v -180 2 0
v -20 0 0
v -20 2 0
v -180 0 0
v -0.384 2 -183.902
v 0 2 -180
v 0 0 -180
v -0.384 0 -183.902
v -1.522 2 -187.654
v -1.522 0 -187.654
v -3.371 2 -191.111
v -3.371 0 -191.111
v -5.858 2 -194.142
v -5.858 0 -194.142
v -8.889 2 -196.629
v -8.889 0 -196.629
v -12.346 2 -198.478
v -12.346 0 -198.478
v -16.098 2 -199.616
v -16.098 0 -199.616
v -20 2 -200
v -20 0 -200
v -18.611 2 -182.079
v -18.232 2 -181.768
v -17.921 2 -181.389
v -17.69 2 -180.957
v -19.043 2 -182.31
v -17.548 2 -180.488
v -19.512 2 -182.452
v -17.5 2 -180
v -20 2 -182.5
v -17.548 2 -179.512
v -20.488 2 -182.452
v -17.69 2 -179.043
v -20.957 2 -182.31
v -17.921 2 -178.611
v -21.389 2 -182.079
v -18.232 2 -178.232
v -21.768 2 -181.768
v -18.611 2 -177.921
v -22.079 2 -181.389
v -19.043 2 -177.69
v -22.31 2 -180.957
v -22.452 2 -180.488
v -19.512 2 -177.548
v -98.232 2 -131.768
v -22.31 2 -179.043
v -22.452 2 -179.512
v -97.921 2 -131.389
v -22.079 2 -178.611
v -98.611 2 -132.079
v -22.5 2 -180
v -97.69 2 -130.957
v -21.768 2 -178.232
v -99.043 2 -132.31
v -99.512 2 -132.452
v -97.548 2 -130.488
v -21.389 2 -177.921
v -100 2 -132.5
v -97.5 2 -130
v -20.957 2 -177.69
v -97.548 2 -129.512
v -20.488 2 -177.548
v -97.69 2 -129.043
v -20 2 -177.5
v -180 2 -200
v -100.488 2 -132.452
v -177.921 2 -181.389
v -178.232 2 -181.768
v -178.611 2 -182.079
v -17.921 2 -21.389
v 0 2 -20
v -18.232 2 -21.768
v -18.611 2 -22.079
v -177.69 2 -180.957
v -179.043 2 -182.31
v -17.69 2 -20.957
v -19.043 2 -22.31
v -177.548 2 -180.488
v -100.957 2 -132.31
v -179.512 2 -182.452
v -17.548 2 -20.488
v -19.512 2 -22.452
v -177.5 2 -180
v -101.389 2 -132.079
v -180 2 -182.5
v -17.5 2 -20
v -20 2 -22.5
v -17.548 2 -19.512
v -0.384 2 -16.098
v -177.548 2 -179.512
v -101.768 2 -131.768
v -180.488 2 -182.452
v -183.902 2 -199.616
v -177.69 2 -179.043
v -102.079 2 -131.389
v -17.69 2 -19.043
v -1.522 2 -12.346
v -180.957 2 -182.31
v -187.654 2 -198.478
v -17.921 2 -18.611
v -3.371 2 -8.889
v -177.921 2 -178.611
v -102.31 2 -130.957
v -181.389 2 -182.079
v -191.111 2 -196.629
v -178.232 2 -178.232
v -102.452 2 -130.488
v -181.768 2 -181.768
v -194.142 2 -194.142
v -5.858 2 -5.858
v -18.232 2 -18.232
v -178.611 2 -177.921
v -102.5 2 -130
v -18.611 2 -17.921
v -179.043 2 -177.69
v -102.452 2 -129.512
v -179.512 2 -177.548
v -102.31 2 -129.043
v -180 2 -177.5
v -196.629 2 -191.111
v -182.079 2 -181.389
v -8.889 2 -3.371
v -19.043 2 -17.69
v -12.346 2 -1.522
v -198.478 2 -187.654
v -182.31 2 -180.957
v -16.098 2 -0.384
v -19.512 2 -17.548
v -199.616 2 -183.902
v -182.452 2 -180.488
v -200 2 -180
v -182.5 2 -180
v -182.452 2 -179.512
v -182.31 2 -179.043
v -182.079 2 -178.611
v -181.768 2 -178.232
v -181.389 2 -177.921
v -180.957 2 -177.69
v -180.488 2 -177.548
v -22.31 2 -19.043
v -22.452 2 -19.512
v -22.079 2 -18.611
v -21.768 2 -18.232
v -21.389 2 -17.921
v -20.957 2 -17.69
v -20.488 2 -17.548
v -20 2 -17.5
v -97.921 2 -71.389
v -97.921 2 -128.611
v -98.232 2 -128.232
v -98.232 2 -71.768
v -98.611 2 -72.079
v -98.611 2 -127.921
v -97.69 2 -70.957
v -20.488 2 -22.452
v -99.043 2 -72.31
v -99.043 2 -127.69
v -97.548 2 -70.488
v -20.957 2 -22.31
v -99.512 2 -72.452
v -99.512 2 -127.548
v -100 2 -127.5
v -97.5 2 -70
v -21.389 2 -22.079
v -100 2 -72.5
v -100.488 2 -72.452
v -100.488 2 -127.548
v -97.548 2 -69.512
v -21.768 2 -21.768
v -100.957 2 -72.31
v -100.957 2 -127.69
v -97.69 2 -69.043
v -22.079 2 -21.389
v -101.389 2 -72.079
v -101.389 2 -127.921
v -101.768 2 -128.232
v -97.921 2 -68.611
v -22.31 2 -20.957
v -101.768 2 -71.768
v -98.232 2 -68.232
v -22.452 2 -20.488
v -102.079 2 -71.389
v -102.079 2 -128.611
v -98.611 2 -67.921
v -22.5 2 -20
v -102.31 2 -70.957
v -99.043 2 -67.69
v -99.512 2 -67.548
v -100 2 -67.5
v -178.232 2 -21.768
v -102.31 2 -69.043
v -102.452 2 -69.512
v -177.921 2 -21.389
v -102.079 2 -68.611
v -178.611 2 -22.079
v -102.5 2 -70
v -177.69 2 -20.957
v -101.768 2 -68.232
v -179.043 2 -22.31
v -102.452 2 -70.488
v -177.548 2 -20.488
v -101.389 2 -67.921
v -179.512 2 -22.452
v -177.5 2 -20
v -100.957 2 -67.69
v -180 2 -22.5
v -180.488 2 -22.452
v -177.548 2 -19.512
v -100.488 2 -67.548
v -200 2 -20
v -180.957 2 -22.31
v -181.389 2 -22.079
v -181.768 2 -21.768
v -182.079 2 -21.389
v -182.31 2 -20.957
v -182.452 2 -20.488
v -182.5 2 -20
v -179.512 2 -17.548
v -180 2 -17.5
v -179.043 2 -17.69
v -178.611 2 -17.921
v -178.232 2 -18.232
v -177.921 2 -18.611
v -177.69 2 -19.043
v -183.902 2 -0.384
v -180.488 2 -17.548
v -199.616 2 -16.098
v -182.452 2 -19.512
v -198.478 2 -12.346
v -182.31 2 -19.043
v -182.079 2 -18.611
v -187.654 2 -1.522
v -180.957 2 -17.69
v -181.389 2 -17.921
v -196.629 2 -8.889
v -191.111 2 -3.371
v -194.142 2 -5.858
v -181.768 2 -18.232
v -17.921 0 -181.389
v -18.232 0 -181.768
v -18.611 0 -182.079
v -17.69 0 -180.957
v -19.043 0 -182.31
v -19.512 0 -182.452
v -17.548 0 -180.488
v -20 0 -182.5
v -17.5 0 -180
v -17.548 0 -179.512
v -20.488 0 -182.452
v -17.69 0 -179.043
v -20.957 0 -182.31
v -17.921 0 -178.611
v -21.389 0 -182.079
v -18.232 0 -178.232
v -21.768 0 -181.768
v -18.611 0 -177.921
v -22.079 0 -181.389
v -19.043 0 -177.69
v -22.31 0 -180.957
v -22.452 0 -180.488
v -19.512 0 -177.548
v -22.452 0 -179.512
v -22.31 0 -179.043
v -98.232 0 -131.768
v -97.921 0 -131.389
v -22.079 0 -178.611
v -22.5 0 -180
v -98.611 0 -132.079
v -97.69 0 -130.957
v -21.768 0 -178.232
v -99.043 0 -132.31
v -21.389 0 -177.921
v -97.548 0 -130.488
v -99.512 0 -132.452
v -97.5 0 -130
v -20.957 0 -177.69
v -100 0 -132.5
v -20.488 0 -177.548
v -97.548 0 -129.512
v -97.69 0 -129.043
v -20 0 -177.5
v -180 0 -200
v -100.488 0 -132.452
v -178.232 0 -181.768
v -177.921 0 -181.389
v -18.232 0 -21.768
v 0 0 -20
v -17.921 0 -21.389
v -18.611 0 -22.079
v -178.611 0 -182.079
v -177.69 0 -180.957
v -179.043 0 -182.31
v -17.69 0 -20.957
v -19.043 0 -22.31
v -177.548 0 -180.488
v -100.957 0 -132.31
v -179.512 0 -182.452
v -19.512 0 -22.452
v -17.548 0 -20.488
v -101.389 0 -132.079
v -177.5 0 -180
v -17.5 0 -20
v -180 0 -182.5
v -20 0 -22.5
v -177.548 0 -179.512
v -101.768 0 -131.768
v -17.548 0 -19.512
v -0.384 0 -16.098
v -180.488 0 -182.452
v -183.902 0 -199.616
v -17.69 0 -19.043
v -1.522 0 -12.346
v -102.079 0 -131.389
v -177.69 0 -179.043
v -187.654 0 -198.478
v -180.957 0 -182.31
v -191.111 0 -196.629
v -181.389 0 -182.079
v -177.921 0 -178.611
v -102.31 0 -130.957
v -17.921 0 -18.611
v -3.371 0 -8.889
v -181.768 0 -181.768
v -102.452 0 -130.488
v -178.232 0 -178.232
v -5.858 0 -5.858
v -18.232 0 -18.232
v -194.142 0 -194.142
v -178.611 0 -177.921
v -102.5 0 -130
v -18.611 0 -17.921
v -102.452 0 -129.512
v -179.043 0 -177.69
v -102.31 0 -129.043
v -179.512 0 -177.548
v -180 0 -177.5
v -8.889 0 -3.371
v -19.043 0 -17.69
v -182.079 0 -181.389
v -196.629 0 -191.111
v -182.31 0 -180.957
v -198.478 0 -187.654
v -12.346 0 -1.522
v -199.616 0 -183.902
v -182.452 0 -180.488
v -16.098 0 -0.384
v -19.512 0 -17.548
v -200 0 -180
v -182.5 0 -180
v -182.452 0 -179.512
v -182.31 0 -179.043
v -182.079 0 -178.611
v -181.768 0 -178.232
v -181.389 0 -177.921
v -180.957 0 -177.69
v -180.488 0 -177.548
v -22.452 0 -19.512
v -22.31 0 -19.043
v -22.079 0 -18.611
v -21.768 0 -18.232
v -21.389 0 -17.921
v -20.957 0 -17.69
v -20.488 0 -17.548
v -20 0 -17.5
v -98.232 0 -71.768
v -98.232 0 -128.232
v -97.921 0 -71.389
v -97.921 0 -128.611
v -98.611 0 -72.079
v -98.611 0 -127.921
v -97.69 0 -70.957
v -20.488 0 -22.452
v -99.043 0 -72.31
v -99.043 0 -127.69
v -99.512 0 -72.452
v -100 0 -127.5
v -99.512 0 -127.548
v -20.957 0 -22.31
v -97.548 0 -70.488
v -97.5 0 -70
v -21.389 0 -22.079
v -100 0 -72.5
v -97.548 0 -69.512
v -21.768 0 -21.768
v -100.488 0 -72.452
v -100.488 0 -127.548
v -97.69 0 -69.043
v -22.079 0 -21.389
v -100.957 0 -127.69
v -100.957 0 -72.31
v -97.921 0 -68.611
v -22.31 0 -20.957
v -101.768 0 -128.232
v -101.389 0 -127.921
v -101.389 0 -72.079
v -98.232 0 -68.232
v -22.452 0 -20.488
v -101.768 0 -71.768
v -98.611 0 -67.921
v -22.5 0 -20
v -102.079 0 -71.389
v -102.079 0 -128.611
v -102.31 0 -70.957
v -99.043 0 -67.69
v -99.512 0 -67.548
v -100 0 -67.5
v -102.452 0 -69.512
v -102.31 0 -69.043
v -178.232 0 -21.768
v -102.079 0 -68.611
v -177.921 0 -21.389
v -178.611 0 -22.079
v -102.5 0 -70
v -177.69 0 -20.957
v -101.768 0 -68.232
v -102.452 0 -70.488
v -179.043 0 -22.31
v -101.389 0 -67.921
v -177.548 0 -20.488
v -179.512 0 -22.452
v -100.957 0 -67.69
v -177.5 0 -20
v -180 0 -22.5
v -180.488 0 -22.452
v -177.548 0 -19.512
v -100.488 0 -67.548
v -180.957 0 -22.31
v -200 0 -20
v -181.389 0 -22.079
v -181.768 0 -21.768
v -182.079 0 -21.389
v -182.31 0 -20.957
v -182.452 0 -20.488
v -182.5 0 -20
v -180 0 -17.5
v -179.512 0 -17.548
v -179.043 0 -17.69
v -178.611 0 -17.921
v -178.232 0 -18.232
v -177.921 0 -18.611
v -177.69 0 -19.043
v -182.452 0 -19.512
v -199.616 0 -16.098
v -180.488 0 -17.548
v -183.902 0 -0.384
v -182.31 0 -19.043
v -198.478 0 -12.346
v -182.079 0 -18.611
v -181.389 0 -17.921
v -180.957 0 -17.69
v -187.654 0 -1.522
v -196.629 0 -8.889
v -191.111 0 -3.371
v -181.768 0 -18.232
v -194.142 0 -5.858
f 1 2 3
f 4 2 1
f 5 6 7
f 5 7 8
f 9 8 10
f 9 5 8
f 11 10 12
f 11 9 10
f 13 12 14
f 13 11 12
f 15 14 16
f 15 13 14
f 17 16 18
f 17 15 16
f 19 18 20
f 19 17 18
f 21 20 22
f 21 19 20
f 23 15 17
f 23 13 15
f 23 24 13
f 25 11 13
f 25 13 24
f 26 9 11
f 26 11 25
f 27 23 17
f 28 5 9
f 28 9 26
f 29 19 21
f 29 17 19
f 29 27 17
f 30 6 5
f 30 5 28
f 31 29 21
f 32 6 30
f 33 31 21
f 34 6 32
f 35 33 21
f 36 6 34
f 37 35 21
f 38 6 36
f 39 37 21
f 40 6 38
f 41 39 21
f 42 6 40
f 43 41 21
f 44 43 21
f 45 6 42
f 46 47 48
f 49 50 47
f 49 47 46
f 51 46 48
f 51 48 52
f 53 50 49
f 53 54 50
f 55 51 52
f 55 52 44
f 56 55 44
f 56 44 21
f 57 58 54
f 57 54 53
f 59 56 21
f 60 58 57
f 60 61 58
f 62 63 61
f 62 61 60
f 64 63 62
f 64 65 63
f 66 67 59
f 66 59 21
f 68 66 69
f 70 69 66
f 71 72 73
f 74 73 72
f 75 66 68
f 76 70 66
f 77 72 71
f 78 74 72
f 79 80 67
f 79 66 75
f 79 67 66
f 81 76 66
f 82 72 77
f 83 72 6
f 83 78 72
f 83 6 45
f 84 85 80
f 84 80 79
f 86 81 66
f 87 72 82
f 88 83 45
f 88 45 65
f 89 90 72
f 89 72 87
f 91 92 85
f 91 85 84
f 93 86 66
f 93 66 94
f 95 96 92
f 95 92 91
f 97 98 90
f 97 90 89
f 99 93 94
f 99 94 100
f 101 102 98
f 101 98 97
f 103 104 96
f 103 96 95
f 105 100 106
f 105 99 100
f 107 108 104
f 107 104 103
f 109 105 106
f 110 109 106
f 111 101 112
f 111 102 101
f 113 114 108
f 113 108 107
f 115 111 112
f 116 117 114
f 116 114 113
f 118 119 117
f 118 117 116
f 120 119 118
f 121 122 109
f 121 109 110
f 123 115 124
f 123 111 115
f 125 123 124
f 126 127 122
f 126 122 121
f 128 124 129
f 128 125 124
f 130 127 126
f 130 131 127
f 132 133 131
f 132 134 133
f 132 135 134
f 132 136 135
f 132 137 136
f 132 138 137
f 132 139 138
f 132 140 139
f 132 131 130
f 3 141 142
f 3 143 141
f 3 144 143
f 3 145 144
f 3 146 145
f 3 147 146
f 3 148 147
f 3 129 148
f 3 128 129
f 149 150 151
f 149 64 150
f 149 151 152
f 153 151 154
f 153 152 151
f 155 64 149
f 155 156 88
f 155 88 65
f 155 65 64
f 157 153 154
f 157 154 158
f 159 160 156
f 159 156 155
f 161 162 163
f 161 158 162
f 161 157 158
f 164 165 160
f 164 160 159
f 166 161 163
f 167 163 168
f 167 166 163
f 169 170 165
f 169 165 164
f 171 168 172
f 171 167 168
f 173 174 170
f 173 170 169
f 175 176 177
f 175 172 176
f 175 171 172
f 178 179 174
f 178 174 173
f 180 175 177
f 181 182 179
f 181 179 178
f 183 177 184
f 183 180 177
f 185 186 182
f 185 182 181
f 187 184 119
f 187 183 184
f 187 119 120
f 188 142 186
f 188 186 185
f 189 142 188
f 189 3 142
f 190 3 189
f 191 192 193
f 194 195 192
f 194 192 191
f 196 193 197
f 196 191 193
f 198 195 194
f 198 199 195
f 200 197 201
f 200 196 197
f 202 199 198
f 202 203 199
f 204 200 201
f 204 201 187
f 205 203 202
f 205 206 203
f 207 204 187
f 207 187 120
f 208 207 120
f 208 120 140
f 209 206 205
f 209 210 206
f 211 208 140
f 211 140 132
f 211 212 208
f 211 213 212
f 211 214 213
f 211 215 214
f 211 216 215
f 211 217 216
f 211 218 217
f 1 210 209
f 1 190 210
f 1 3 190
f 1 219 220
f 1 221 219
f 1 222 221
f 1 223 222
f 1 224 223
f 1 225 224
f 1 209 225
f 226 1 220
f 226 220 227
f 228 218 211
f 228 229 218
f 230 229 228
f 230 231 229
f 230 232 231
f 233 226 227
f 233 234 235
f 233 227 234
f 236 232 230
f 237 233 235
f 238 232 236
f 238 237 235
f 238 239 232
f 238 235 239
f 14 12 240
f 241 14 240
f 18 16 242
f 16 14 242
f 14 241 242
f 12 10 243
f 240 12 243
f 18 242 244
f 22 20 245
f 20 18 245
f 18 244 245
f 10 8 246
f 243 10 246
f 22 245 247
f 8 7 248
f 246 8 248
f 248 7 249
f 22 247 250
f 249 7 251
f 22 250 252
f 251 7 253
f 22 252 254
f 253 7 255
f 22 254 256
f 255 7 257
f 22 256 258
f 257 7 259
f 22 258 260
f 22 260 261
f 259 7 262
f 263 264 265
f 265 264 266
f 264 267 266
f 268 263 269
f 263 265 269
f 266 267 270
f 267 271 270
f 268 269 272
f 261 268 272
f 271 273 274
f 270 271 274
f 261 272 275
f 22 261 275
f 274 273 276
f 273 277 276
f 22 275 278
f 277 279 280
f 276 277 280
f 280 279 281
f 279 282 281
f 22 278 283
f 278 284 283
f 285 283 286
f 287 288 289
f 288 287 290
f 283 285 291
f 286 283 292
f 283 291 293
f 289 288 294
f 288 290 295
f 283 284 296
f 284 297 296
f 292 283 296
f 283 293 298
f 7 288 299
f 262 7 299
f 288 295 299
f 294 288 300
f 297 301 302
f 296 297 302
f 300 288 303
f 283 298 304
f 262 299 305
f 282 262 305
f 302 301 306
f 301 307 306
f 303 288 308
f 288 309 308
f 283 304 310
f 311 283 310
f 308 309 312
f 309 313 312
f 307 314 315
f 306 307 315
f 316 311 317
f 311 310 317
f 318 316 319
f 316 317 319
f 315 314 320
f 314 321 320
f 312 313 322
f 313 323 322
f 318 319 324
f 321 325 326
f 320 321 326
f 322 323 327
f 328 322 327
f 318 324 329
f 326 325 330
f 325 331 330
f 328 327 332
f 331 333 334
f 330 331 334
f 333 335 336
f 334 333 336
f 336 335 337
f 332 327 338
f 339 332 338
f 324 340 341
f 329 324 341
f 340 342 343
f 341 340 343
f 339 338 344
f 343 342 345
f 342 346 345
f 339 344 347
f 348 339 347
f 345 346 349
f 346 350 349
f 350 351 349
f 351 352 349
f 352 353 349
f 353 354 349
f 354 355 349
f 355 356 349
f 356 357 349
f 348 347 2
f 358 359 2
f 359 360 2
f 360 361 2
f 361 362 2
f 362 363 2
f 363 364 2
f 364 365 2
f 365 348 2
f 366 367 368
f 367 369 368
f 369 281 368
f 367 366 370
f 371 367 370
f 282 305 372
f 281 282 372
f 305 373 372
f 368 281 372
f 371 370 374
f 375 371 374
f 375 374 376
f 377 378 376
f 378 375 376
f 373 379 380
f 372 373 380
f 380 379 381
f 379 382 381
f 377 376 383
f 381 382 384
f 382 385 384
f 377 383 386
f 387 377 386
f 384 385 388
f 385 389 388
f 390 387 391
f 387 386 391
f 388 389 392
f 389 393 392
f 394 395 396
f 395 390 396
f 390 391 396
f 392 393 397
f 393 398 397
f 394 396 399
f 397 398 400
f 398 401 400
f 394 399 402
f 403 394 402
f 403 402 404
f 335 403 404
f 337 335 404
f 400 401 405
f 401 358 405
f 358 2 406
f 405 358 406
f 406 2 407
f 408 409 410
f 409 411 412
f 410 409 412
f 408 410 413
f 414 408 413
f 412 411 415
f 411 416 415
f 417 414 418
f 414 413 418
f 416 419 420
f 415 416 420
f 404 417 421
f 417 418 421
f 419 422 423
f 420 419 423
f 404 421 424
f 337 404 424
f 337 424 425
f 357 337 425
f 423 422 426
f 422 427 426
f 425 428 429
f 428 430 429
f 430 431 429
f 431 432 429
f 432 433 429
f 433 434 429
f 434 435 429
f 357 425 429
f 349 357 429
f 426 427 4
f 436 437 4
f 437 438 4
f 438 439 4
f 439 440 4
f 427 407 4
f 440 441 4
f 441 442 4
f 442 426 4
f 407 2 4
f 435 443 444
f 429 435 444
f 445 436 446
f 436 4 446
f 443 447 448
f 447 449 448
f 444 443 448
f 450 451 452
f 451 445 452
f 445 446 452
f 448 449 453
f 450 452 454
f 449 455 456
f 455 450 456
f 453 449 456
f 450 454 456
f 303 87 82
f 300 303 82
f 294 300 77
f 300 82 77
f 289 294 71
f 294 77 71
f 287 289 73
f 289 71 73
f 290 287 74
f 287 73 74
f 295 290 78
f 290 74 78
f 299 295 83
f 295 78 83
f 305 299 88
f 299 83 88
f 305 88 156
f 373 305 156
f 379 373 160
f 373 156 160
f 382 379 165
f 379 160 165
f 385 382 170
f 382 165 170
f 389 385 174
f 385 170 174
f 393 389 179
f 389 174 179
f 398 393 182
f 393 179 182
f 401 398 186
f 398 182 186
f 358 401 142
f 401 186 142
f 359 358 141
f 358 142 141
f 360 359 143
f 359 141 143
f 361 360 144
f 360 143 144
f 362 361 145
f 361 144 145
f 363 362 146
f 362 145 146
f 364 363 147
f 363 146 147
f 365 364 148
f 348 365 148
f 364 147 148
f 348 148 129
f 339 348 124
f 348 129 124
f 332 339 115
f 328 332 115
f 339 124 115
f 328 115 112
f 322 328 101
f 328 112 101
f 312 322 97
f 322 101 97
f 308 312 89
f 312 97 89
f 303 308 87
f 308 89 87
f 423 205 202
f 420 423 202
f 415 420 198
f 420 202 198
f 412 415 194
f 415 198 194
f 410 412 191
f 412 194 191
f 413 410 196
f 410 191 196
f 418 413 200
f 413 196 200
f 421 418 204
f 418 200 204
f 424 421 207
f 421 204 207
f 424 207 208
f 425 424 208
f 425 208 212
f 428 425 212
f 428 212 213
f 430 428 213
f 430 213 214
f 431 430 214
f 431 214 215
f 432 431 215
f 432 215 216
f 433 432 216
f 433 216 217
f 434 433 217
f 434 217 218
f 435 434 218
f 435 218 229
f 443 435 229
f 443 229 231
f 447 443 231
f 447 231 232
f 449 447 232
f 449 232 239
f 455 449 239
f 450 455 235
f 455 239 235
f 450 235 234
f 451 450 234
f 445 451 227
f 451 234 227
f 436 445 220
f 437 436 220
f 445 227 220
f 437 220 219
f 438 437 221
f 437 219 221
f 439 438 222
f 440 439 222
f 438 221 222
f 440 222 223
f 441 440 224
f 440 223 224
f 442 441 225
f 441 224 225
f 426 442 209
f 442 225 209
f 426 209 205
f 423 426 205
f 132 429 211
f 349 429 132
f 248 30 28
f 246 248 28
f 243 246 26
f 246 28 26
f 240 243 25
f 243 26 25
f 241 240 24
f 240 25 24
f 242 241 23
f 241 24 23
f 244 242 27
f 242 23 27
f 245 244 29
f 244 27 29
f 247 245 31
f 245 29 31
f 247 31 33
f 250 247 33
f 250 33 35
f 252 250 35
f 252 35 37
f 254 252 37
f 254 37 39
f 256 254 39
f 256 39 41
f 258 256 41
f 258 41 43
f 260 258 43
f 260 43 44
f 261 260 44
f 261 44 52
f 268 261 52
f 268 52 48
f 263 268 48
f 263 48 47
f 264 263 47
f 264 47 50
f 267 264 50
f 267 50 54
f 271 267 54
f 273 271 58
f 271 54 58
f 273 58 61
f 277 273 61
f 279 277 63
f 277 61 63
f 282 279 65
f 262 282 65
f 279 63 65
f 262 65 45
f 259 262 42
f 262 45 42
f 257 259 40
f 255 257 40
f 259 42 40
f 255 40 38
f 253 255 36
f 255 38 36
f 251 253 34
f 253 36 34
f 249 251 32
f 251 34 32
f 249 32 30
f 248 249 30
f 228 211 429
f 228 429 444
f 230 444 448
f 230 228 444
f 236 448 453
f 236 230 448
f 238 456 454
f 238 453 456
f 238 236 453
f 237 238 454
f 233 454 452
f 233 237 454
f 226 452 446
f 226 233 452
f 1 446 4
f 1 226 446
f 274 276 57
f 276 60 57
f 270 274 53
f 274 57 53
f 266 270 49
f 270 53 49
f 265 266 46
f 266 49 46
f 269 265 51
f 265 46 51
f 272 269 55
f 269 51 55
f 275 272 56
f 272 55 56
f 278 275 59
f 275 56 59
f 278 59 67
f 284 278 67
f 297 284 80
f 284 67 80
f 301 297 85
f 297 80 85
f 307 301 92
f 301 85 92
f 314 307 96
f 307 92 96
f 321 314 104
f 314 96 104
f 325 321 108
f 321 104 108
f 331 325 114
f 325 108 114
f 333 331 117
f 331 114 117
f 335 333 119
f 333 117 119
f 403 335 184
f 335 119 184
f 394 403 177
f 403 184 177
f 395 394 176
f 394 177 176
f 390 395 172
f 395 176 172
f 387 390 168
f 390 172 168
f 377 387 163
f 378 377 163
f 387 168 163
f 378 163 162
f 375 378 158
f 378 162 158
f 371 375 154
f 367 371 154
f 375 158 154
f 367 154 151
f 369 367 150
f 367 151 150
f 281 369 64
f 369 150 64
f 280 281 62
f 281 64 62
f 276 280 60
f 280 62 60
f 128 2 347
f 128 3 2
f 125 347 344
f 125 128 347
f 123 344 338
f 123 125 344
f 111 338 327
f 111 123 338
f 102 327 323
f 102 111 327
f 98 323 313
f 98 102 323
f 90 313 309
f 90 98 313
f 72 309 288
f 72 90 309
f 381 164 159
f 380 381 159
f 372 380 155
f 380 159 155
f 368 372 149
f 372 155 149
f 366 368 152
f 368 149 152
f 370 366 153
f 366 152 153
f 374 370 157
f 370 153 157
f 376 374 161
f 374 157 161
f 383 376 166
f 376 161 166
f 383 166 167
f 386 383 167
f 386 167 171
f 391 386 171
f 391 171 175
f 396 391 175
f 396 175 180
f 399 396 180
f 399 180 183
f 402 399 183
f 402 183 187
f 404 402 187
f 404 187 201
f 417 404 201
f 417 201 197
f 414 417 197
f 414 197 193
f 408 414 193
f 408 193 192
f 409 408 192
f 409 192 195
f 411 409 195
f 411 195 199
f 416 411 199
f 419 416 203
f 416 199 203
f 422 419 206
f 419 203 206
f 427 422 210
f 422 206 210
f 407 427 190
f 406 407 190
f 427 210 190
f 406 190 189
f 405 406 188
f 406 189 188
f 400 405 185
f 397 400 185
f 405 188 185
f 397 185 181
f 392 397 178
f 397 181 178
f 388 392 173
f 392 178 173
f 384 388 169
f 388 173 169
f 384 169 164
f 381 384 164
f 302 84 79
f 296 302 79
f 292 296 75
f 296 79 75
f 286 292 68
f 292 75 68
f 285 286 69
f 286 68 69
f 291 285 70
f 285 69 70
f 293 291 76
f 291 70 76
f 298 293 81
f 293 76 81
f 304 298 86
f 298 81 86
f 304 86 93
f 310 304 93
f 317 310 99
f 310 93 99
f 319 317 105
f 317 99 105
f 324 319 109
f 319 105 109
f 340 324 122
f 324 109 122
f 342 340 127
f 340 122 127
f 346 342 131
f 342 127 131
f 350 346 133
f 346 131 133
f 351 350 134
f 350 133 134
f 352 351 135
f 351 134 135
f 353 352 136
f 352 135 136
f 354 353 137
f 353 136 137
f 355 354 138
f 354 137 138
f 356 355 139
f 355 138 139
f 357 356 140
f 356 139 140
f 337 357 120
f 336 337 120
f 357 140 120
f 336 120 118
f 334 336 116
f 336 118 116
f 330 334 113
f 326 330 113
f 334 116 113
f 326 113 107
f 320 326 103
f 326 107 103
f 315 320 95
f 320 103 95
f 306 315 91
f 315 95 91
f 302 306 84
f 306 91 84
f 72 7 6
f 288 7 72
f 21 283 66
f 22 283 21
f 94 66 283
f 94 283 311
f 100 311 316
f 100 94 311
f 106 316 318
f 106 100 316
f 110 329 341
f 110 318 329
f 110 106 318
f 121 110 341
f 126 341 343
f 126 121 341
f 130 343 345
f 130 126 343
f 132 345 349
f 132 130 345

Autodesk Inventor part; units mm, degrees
ref_plane "YZ Plane" through (0, 0, 0) normal (1, 0, 0) x (0, 1, 0)
ref_plane "XZ Plane" through (0, 0, 0) normal (0, 1, 0) x (-1, 0, 0)
ref_plane "XY Plane" through (0, 0, 0) normal (0, 0, 1) x (1, 0, 0)
sketch "Sketch1" plane through (0, 0, 0) normal (0, 1, 0) x (-1, 0, 0)
  line L0 (0, 0) -> (200, 0)
  line L1 (200, 0) -> (200, -200)
  line L2 (200, -200) -> (0, -200)
  line L3 (0, -200) -> (0, 0)
  dimension "d0" = 200
  dimension "d1" = 200
extrude "Extrusion1" add sketch "Sketch1" along normal blind 2
fillet "Fillet1" radius 20 4 edges at (-200, 1, 0) (0, 1, 0) (0, 1, -200) (-200, 1, -200)
sketch "Sketch4" plane through (0, 2, 0) normal (0, 1, 0) x (1, 0, 0)
  arc A0 (-20, 0) -> (0, 20) centre (-20, 20) ccw projected
  arc A1 (-200, 20) -> (-180, 0) centre (-180, 20) ccw projected
  arc A2 (0, 180) -> (-20, 200) centre (-20, 180) ccw projected
  arc A3 (-180, 200) -> (-200, 180) centre (-180, 180) ccw projected
  circle A4 centre (-20, 180) radius 2.5
  circle A5 centre (-180, 180) radius 2.5
  circle A6 centre (-180, 20) radius 2.5
  circle A7 centre (-20, 20) radius 2.5
  line L0 (-180, 0) -> (-20, 0) projected
  line L1 (0, 20) -> (0, 180) projected
  point P0 (0, 0)
  dimension "d19" = 5
  dimension "d20" = 5
  dimension "d21" = 5
  dimension "d22" = 5
extrude "Extrusion4" cut sketch "Sketch4" against normal blind 2
sketch "Sketch6" plane through (0, 2, 0) normal (0, 1, 0) x (1, 0, 0)
  circle A0 centre (-100, 70) radius 2.5
  circle A1 centre (-100, 130) radius 2.5
  point P0 (0, 0)
  dimension "d34" = 5
  dimension "d35" = 5
extrude "Extrusion6" cut sketch "Sketch6" against normal blind 10
properties part number "Basequadrada" material "PPS Plastic"
